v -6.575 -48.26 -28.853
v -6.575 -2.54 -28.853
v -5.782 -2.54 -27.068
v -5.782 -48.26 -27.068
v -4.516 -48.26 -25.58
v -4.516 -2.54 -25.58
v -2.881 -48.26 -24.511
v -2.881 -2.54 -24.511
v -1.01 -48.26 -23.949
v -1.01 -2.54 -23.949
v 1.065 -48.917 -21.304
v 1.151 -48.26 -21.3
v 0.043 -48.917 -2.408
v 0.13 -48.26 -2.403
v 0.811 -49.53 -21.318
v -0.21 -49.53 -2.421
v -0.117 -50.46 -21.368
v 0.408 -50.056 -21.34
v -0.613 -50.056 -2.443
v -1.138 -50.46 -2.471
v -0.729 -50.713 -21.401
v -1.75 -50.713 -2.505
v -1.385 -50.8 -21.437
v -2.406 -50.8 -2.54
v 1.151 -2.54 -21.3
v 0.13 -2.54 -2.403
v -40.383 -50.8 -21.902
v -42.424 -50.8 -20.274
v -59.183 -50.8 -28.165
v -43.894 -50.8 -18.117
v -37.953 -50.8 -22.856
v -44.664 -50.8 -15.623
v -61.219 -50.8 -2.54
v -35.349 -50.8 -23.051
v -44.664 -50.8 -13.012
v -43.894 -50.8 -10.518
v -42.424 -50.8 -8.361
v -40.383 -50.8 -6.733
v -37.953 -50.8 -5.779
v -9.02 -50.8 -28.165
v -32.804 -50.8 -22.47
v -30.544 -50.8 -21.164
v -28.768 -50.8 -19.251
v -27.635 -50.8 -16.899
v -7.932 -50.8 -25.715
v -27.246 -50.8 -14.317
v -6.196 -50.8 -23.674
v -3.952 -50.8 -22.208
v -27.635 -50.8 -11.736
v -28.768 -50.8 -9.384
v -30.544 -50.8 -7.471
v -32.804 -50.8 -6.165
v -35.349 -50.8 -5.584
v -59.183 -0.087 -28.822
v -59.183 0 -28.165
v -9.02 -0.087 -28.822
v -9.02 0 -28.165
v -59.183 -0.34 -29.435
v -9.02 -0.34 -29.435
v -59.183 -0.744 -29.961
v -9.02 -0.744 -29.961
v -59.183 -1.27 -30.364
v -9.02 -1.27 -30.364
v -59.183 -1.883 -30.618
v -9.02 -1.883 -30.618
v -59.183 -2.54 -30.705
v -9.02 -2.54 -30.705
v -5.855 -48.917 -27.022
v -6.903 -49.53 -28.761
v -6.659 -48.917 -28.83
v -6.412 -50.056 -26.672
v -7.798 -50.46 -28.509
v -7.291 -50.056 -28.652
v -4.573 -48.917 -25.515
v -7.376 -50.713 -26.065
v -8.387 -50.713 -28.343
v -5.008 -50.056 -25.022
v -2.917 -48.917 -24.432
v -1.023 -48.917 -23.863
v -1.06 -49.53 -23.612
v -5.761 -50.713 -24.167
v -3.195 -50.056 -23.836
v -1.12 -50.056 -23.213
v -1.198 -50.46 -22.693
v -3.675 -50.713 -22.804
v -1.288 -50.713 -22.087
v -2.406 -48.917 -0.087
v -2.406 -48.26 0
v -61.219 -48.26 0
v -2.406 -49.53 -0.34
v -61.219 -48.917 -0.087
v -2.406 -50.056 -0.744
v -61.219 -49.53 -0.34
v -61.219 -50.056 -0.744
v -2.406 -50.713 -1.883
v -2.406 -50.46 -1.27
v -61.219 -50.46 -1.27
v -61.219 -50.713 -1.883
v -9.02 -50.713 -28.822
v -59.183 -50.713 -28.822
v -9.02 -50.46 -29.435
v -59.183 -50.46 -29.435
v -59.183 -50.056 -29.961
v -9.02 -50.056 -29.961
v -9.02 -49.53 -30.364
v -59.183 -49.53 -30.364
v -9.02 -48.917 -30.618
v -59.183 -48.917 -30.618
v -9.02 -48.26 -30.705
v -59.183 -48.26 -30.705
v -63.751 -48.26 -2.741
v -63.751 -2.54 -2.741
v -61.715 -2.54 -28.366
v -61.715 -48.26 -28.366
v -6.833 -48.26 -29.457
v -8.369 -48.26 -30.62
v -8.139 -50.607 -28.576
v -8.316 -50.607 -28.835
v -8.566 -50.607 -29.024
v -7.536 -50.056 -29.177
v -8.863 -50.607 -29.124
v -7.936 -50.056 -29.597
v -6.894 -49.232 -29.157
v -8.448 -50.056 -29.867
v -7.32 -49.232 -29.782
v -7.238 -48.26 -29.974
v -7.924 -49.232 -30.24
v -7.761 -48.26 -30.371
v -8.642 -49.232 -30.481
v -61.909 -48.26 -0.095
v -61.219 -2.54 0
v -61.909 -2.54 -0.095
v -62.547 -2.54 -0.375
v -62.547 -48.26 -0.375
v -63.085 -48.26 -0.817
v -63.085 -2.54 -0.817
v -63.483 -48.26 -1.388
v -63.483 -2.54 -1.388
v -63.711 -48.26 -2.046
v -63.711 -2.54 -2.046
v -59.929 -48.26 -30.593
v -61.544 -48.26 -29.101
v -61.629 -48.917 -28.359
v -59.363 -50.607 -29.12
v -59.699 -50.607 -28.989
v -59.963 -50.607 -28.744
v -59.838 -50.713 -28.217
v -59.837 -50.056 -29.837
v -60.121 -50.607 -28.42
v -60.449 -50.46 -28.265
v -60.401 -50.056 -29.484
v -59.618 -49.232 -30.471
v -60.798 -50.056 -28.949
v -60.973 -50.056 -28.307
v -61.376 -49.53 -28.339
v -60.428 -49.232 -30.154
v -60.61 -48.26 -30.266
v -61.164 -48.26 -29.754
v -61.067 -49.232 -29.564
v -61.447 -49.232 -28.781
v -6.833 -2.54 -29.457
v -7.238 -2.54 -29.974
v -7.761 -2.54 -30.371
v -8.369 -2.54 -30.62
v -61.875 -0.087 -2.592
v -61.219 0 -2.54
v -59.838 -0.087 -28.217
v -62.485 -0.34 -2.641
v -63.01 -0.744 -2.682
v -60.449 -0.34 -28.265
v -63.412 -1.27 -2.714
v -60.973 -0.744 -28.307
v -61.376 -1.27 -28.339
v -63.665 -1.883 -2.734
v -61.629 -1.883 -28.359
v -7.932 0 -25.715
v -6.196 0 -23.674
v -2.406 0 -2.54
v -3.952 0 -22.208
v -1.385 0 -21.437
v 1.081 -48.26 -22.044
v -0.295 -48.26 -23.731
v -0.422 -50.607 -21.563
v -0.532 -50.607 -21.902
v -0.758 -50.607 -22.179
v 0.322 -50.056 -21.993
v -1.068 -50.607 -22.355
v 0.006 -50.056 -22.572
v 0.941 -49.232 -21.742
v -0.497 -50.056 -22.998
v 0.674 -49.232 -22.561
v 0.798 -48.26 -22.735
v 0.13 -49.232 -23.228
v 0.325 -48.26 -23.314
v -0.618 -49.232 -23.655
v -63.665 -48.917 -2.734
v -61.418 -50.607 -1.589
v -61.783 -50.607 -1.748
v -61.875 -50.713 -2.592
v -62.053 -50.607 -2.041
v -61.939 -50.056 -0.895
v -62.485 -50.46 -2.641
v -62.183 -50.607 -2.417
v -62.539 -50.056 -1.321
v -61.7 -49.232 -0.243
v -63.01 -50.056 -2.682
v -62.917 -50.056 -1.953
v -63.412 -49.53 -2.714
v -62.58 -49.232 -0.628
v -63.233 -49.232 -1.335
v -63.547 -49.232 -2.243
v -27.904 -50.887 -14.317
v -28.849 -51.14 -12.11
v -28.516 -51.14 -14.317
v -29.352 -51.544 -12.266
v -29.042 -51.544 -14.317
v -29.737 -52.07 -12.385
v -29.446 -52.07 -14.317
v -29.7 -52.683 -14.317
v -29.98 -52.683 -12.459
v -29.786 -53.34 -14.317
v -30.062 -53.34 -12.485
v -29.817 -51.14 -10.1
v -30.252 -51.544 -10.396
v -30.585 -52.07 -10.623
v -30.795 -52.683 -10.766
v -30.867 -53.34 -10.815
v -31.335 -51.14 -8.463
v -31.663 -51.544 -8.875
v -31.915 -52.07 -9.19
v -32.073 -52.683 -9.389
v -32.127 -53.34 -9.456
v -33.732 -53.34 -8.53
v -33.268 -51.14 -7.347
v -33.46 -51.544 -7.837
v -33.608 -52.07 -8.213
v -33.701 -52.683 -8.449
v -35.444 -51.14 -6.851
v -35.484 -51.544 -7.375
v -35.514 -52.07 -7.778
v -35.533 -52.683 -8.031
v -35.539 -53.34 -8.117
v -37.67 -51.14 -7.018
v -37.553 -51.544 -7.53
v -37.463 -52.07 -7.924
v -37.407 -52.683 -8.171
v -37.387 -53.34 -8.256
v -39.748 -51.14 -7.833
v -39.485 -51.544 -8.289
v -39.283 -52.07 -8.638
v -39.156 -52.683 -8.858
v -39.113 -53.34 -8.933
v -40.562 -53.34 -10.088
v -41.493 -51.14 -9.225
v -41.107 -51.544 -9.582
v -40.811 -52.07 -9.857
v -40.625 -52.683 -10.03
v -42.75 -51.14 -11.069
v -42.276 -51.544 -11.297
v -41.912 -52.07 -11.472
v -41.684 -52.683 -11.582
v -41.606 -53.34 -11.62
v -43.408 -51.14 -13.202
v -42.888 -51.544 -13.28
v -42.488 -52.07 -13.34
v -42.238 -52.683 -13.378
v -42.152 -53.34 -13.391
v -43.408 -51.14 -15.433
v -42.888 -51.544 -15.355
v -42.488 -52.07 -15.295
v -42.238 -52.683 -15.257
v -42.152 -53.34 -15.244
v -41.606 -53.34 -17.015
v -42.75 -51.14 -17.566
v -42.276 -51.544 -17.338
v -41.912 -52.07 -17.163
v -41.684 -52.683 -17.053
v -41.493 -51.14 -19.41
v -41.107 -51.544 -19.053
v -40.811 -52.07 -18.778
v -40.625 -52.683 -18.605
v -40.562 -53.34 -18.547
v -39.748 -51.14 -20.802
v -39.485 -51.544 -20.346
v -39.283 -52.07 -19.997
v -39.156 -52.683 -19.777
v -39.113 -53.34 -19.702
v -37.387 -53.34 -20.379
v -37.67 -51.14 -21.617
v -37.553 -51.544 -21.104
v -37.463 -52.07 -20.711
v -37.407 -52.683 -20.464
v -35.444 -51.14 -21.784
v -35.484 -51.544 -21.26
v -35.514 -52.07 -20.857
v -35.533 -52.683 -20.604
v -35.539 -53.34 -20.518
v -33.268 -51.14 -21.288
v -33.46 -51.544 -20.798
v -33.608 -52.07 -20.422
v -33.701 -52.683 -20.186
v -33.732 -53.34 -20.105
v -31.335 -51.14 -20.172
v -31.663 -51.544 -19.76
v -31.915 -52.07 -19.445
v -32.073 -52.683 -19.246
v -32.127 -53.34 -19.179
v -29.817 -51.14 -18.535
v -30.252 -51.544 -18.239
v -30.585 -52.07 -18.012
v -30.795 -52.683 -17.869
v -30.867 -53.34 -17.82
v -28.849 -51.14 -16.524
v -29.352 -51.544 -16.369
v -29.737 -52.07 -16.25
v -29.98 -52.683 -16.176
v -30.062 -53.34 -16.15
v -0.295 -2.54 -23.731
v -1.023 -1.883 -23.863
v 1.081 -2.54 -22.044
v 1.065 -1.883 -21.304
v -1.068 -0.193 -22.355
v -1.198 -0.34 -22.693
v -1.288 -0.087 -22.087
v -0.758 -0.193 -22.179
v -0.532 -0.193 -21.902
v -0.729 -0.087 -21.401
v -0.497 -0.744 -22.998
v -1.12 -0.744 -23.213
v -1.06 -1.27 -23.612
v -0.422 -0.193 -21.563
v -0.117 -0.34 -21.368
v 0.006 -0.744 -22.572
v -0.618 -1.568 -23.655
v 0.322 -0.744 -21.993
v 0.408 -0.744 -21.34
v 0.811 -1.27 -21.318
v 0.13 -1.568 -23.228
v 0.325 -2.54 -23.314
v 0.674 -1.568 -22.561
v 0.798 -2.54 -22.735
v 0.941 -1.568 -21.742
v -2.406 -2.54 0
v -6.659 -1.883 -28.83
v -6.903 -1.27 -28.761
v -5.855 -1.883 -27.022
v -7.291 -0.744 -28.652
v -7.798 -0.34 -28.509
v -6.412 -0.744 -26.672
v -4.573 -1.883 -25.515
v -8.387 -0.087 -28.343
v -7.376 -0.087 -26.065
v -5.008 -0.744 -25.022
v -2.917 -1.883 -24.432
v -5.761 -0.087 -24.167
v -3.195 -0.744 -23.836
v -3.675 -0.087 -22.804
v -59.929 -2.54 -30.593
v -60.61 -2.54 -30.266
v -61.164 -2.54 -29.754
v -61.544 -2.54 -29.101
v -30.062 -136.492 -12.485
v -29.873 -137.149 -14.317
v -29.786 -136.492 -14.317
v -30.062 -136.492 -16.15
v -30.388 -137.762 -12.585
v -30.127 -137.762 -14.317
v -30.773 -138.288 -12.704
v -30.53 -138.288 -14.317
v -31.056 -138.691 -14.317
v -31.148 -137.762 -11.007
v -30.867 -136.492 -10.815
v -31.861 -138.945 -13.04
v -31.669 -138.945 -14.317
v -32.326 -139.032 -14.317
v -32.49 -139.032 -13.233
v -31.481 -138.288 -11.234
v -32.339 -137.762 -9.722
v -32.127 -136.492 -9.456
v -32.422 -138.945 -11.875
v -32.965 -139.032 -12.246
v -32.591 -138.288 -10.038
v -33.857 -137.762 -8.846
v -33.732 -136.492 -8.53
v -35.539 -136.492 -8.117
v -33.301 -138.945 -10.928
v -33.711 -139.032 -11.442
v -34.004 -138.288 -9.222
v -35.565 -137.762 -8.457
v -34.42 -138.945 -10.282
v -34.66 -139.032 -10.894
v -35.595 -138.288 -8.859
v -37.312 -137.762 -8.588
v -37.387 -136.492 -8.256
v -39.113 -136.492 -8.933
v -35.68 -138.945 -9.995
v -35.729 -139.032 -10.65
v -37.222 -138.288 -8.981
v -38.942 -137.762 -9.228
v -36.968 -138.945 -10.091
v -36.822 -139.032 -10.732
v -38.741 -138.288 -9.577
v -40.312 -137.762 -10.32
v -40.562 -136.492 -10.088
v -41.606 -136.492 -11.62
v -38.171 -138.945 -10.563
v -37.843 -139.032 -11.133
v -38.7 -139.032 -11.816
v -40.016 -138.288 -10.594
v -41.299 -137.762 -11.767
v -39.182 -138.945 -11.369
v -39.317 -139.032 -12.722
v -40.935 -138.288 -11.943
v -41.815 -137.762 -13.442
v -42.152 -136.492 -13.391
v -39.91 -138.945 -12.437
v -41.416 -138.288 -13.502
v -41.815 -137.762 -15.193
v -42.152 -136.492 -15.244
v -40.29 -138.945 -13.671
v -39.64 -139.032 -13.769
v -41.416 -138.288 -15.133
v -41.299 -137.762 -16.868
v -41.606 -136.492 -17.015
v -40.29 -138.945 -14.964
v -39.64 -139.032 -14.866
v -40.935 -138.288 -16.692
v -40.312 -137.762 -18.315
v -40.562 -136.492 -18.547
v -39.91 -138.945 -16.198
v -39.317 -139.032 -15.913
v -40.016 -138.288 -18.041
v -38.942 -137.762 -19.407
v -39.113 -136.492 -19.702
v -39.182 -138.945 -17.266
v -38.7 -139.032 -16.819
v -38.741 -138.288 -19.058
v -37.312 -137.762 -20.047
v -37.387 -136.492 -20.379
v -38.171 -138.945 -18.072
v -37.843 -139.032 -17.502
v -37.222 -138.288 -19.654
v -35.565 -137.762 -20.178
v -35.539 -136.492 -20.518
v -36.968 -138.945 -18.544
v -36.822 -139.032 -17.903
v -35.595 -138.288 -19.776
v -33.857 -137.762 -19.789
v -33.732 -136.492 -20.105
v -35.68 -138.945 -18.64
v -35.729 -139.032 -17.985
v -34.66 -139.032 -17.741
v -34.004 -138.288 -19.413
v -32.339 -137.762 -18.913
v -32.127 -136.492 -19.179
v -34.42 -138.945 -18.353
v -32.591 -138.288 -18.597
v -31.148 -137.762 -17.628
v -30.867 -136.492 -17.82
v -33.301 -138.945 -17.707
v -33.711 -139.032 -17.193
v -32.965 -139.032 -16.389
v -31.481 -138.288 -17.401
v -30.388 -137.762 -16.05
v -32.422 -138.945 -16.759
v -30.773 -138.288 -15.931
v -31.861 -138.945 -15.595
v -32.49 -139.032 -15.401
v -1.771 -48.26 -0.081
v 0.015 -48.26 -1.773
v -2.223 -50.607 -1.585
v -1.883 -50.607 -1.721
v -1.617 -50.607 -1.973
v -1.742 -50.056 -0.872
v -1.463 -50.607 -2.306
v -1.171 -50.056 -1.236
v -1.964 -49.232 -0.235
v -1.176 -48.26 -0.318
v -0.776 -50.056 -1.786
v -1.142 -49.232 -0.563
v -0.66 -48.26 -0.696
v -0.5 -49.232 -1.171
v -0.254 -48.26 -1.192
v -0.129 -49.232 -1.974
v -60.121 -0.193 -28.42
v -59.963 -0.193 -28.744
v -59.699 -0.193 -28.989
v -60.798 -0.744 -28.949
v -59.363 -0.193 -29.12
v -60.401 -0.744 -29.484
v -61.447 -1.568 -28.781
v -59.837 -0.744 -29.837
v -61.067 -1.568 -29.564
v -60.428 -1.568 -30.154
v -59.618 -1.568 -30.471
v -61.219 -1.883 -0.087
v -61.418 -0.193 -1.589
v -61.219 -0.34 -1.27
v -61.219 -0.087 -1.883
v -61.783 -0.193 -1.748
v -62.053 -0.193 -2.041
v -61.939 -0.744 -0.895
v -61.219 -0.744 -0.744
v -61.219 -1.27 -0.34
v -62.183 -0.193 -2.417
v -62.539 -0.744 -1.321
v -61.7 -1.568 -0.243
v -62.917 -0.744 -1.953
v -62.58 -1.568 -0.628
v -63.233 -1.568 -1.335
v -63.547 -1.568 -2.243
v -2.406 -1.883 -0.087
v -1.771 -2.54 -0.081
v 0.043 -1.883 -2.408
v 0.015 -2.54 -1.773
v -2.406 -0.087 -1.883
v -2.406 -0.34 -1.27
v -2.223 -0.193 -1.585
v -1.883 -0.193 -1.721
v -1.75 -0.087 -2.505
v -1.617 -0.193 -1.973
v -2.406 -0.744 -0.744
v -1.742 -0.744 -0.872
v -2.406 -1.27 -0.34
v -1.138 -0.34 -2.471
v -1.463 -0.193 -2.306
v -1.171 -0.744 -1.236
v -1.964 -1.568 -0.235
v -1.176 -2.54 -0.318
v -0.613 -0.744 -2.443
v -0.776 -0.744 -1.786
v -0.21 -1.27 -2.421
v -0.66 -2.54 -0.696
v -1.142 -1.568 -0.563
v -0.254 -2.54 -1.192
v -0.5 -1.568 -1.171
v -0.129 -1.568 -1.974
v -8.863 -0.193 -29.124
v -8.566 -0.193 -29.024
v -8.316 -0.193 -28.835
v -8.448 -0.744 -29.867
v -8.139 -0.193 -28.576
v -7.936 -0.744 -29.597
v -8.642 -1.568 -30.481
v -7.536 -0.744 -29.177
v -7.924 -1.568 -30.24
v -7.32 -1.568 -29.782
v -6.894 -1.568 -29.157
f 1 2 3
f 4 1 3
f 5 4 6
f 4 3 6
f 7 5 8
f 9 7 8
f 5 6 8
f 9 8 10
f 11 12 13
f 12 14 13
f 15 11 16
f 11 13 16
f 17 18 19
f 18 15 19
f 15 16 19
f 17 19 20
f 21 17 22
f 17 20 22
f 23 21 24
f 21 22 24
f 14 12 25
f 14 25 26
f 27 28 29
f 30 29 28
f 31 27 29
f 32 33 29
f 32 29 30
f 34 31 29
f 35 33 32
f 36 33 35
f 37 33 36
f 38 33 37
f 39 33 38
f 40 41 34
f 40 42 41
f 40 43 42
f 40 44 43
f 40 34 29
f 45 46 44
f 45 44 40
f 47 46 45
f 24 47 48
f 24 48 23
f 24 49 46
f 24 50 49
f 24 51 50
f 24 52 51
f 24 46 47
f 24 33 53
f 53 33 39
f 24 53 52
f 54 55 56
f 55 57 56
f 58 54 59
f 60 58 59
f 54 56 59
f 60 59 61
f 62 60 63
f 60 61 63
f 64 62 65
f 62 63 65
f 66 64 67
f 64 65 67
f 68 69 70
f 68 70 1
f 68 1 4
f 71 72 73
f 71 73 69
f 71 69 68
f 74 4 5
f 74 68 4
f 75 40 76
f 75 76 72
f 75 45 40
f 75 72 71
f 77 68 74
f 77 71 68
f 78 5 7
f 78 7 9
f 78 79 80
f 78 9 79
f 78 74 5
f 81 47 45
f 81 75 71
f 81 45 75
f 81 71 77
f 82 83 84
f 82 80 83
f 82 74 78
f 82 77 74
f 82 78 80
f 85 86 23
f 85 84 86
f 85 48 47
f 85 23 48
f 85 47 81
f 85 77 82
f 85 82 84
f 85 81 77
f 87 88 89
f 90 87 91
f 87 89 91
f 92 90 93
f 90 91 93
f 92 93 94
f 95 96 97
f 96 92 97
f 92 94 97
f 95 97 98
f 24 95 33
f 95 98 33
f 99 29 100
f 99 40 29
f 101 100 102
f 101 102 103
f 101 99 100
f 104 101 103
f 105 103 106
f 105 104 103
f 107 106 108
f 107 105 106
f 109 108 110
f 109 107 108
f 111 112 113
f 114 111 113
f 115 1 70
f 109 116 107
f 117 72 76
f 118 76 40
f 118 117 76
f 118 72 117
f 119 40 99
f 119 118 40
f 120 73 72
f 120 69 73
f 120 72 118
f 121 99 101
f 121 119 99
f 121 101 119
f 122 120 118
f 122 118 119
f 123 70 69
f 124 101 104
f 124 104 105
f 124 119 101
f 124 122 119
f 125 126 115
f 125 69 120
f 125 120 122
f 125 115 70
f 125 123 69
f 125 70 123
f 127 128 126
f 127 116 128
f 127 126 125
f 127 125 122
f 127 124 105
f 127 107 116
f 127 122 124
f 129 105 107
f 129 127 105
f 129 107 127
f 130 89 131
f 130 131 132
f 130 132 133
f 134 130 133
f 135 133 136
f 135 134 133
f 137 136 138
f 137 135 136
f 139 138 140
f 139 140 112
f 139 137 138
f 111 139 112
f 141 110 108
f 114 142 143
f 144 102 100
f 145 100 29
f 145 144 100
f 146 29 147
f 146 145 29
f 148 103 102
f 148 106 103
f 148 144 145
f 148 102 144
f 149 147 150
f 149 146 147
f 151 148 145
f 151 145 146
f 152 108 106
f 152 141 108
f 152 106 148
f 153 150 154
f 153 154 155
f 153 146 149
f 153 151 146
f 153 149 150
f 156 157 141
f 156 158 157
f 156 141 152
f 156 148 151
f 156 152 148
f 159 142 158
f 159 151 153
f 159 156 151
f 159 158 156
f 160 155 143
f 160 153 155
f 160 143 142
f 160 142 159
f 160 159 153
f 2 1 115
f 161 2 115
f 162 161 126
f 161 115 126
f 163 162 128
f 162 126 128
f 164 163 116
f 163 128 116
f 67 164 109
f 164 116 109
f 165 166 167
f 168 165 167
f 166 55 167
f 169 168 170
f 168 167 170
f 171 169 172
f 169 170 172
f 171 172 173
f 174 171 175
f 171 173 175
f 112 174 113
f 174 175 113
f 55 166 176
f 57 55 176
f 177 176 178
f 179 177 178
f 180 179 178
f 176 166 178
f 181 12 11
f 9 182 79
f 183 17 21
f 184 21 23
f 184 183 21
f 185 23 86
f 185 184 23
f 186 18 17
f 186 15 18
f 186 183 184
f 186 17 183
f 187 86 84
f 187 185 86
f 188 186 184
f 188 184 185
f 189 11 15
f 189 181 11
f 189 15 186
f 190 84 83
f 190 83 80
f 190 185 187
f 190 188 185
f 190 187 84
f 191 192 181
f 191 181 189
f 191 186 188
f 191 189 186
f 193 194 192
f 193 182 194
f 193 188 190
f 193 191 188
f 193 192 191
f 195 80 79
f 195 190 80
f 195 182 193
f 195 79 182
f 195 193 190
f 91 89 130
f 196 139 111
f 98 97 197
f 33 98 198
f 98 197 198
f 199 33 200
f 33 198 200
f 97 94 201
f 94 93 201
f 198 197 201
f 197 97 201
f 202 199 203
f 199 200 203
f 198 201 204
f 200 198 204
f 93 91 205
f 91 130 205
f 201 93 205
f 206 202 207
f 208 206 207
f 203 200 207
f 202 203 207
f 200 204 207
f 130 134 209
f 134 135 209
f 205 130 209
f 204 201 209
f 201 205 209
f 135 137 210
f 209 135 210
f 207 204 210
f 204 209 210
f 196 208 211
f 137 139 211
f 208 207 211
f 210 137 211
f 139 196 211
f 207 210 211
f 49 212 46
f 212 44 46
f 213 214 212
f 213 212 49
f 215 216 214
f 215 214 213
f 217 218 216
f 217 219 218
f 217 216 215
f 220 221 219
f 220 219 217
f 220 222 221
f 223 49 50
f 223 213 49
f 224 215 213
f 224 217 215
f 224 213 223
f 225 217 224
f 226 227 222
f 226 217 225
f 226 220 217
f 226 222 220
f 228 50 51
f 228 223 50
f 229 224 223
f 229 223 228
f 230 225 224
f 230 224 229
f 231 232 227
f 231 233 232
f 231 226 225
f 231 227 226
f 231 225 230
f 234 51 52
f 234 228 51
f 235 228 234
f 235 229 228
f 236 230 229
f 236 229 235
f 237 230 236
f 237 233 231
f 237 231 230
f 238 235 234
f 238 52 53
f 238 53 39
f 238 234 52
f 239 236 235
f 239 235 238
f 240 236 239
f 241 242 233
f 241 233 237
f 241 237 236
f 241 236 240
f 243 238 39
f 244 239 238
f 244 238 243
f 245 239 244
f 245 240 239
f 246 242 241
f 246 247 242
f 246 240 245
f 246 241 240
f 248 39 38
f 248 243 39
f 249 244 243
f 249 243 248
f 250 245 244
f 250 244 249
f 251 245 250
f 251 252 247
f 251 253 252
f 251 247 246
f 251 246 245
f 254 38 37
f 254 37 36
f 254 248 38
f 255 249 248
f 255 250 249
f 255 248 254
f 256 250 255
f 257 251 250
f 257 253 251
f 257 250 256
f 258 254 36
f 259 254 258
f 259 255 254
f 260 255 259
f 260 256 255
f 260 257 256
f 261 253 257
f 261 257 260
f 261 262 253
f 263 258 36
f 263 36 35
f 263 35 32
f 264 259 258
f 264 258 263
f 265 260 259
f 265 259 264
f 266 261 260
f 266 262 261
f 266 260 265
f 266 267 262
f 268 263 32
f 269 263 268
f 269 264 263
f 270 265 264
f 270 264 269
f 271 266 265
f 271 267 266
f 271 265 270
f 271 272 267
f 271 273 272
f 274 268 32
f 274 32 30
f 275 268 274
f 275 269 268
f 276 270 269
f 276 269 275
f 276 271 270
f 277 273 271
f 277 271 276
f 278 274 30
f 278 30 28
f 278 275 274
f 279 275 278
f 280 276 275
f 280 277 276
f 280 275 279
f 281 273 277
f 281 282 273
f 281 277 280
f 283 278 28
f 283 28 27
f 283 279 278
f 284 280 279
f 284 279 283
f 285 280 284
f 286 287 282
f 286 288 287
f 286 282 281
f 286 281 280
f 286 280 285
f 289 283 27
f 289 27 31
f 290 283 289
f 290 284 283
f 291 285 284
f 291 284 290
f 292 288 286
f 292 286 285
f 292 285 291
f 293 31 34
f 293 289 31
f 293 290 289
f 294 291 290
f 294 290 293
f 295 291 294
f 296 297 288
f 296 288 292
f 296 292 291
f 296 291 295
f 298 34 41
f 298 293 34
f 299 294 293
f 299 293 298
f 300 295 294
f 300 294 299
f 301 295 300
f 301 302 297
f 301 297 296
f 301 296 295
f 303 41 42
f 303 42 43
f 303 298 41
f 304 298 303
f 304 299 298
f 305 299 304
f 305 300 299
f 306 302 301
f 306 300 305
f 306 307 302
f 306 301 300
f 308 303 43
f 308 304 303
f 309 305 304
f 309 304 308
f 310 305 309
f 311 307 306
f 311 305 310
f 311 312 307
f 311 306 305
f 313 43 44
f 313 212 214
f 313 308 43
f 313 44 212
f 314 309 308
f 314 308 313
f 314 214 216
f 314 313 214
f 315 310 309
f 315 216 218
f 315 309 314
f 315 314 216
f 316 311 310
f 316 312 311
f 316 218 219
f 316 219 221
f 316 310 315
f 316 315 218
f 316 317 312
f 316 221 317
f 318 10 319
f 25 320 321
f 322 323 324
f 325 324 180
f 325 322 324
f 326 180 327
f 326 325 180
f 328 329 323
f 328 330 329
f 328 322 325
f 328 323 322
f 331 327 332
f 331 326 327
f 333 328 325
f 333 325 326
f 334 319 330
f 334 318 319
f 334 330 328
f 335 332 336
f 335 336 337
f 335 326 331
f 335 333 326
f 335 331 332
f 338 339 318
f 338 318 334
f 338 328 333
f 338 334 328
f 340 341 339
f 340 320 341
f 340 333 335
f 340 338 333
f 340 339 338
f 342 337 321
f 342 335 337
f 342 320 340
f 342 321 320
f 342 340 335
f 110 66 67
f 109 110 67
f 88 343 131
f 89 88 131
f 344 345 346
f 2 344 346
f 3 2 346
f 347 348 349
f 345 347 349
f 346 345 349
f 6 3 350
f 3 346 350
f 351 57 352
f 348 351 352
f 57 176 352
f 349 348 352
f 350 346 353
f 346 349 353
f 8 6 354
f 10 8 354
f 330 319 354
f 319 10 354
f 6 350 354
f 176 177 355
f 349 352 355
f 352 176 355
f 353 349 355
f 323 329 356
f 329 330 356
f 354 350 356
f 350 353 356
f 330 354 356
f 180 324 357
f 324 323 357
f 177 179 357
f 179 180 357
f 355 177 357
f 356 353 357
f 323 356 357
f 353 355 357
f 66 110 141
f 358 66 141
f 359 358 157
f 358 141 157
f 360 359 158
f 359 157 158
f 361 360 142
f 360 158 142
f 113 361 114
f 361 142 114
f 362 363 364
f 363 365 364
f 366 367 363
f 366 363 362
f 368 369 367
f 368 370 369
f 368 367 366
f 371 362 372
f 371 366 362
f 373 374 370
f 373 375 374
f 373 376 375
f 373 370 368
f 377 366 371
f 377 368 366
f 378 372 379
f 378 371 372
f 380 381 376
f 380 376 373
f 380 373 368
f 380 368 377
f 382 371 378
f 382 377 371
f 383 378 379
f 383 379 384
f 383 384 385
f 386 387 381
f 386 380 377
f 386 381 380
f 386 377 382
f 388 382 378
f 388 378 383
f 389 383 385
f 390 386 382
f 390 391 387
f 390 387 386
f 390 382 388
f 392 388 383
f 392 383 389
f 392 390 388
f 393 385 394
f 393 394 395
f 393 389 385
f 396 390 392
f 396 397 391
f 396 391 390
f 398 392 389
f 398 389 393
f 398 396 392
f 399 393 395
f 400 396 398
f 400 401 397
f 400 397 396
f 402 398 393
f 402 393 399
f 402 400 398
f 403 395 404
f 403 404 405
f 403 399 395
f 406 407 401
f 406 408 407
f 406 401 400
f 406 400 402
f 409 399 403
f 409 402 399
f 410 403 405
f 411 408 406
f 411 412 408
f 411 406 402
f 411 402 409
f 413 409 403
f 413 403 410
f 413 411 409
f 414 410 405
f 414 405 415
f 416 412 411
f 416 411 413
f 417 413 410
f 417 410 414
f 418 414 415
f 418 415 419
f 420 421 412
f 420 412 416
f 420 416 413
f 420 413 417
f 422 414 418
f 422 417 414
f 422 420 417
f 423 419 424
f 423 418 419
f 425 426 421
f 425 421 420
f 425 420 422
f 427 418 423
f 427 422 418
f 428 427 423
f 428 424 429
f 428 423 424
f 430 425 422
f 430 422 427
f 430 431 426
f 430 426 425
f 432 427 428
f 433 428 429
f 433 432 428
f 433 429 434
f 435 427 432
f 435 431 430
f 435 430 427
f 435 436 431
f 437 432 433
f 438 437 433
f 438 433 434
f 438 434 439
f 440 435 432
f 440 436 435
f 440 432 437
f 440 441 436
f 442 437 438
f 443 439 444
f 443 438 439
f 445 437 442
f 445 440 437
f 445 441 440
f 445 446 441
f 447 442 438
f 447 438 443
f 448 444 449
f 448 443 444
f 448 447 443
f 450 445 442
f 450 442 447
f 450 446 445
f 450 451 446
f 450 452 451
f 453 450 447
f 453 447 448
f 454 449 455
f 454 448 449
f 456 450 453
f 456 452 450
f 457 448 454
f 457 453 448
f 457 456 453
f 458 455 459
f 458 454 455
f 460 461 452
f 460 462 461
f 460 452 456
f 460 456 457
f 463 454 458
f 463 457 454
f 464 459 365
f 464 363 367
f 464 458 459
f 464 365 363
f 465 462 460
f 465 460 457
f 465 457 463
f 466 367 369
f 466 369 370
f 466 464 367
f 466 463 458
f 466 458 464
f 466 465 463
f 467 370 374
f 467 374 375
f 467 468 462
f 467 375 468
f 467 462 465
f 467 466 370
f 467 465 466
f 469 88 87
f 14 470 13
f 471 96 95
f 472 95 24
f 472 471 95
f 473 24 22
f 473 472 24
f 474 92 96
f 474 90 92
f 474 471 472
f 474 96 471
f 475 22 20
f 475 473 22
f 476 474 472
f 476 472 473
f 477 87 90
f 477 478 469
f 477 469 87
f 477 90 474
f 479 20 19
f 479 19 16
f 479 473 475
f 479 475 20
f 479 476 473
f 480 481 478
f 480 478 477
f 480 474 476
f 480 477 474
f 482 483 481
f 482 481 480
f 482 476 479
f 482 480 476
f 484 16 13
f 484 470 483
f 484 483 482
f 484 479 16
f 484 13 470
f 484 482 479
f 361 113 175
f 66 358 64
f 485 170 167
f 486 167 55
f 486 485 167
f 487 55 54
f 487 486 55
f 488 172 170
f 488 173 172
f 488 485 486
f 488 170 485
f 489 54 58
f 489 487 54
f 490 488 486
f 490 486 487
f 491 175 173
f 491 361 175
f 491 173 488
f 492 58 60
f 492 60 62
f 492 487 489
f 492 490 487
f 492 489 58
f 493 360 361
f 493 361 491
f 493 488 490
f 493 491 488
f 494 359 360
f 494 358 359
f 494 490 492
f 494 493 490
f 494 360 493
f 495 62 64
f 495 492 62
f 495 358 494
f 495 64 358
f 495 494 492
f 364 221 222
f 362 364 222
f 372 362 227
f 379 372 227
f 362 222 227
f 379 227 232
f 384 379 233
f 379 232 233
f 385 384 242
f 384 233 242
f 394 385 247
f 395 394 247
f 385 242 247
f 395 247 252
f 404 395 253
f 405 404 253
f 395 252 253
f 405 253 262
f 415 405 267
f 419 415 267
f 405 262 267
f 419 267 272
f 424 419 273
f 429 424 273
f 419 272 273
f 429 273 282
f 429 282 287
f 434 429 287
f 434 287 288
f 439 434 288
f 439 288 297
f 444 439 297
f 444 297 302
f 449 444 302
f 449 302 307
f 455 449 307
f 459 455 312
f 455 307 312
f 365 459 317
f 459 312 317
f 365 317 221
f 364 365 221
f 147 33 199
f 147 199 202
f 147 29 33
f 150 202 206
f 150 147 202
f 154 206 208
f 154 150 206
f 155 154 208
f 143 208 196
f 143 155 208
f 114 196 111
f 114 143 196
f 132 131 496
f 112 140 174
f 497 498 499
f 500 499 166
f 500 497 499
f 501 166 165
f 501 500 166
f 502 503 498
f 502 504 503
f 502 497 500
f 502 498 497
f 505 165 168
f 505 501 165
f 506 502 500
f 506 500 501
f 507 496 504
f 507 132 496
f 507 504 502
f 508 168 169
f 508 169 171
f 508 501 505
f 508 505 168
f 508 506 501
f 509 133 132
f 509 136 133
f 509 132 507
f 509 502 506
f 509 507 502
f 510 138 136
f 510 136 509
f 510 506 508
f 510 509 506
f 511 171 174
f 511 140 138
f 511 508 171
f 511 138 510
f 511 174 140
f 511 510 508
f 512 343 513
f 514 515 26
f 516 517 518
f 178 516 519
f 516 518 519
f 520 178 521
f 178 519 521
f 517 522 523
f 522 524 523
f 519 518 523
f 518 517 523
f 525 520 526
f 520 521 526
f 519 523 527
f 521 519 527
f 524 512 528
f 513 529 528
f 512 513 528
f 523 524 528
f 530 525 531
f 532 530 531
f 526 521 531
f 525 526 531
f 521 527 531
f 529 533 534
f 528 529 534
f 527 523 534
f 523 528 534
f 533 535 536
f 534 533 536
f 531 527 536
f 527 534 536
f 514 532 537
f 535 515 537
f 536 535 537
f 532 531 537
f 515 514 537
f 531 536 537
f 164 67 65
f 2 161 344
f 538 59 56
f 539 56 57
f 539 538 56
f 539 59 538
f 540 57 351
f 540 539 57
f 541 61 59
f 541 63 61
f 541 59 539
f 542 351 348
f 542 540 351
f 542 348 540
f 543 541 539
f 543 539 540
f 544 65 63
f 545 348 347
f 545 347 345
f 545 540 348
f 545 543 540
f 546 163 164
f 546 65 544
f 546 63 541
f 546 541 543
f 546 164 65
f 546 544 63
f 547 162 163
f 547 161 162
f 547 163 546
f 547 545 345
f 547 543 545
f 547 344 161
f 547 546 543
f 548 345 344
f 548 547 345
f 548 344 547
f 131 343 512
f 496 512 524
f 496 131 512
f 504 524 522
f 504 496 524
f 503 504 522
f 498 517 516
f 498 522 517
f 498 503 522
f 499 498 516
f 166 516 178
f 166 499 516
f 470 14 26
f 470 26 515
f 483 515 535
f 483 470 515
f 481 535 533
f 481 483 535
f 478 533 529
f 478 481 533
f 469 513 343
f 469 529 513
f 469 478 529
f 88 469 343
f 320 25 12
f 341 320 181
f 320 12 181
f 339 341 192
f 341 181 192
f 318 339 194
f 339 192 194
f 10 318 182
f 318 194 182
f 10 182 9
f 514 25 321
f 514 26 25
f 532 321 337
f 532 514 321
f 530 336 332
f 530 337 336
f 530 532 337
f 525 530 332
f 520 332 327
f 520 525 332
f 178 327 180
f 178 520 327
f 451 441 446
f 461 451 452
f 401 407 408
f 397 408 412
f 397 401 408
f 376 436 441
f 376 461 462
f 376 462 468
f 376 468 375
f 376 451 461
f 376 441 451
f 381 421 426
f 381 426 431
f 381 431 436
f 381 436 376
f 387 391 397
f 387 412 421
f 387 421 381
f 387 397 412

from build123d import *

# Parameters (mm, degrees)
F1_DEPTH = 50.8
F2_R     = 6.217599599
F3_DEPTH = 88.2316216
F4_R     = 2.54


# Not quite as in the source:
# - an extrude ends at something that could not be found from the text; its depth is read off the source's solid


with BuildPart() as f1:
    # F0 (on Front) → F1 (new body)
    with BuildSketch(Plane.XZ):
        with BuildLine():
            Line((1.2967513424, -23.9979514112), (0, 0))
            Line((0, 0), (-63.9691352844, 0))
            Line((-63.9691352844, 0), (-61.5289509296, -30.7046994567))
            Line((-61.5289509296, -30.7046994567), (-6.8309613811, -30.7046994567))
            ThreePointArc((-6.8309613811, -30.7046994567), (-4.3476416049, -25.4359191552), (1.2967513424, -23.9979514112))
        make_face()
    extrude(amount=F1_DEPTH)

    # F2 (on face) → F3 (join, through all)
    with BuildSketch(Plane.XZ.offset(50.8)):
        with Locations((-36.0038354993, -14.3174901605)):
            Circle(F2_R)
    extrude(amount=F3_DEPTH)

    # F4
    f4_edges = [f1.edges().sort_by_distance(p)[0] for p in [
        (-42.221435, -139.031622, -14.31749),
        (-61.528951, -25.4, -30.704699),
        (-63.969135, -25.4, 0),
        (1.296751, -25.4, -23.997951),
        (-6.830961, -25.4, -30.704699),
        (0, -25.4, 0),
        (-31.984568, 0, 0),
        (-62.749043, 0, -15.35235),
        (-34.179956, 0, -30.704699),
        (-4.347642, 0, -25.435919),
        (0.648376, 0, -11.998976),
        (-31.984568, -50.8, 0),
        (0.648376, -50.8, -11.998976),
        (-4.347642, -50.8, -25.435919),
        (-34.179956, -50.8, -30.704699),
        (-62.749043, -50.8, -15.35235),
        (-42.221435, -50.8, -14.31749),
    ]]
    fillet(f4_edges, radius=F4_R)


solid = f1.part
